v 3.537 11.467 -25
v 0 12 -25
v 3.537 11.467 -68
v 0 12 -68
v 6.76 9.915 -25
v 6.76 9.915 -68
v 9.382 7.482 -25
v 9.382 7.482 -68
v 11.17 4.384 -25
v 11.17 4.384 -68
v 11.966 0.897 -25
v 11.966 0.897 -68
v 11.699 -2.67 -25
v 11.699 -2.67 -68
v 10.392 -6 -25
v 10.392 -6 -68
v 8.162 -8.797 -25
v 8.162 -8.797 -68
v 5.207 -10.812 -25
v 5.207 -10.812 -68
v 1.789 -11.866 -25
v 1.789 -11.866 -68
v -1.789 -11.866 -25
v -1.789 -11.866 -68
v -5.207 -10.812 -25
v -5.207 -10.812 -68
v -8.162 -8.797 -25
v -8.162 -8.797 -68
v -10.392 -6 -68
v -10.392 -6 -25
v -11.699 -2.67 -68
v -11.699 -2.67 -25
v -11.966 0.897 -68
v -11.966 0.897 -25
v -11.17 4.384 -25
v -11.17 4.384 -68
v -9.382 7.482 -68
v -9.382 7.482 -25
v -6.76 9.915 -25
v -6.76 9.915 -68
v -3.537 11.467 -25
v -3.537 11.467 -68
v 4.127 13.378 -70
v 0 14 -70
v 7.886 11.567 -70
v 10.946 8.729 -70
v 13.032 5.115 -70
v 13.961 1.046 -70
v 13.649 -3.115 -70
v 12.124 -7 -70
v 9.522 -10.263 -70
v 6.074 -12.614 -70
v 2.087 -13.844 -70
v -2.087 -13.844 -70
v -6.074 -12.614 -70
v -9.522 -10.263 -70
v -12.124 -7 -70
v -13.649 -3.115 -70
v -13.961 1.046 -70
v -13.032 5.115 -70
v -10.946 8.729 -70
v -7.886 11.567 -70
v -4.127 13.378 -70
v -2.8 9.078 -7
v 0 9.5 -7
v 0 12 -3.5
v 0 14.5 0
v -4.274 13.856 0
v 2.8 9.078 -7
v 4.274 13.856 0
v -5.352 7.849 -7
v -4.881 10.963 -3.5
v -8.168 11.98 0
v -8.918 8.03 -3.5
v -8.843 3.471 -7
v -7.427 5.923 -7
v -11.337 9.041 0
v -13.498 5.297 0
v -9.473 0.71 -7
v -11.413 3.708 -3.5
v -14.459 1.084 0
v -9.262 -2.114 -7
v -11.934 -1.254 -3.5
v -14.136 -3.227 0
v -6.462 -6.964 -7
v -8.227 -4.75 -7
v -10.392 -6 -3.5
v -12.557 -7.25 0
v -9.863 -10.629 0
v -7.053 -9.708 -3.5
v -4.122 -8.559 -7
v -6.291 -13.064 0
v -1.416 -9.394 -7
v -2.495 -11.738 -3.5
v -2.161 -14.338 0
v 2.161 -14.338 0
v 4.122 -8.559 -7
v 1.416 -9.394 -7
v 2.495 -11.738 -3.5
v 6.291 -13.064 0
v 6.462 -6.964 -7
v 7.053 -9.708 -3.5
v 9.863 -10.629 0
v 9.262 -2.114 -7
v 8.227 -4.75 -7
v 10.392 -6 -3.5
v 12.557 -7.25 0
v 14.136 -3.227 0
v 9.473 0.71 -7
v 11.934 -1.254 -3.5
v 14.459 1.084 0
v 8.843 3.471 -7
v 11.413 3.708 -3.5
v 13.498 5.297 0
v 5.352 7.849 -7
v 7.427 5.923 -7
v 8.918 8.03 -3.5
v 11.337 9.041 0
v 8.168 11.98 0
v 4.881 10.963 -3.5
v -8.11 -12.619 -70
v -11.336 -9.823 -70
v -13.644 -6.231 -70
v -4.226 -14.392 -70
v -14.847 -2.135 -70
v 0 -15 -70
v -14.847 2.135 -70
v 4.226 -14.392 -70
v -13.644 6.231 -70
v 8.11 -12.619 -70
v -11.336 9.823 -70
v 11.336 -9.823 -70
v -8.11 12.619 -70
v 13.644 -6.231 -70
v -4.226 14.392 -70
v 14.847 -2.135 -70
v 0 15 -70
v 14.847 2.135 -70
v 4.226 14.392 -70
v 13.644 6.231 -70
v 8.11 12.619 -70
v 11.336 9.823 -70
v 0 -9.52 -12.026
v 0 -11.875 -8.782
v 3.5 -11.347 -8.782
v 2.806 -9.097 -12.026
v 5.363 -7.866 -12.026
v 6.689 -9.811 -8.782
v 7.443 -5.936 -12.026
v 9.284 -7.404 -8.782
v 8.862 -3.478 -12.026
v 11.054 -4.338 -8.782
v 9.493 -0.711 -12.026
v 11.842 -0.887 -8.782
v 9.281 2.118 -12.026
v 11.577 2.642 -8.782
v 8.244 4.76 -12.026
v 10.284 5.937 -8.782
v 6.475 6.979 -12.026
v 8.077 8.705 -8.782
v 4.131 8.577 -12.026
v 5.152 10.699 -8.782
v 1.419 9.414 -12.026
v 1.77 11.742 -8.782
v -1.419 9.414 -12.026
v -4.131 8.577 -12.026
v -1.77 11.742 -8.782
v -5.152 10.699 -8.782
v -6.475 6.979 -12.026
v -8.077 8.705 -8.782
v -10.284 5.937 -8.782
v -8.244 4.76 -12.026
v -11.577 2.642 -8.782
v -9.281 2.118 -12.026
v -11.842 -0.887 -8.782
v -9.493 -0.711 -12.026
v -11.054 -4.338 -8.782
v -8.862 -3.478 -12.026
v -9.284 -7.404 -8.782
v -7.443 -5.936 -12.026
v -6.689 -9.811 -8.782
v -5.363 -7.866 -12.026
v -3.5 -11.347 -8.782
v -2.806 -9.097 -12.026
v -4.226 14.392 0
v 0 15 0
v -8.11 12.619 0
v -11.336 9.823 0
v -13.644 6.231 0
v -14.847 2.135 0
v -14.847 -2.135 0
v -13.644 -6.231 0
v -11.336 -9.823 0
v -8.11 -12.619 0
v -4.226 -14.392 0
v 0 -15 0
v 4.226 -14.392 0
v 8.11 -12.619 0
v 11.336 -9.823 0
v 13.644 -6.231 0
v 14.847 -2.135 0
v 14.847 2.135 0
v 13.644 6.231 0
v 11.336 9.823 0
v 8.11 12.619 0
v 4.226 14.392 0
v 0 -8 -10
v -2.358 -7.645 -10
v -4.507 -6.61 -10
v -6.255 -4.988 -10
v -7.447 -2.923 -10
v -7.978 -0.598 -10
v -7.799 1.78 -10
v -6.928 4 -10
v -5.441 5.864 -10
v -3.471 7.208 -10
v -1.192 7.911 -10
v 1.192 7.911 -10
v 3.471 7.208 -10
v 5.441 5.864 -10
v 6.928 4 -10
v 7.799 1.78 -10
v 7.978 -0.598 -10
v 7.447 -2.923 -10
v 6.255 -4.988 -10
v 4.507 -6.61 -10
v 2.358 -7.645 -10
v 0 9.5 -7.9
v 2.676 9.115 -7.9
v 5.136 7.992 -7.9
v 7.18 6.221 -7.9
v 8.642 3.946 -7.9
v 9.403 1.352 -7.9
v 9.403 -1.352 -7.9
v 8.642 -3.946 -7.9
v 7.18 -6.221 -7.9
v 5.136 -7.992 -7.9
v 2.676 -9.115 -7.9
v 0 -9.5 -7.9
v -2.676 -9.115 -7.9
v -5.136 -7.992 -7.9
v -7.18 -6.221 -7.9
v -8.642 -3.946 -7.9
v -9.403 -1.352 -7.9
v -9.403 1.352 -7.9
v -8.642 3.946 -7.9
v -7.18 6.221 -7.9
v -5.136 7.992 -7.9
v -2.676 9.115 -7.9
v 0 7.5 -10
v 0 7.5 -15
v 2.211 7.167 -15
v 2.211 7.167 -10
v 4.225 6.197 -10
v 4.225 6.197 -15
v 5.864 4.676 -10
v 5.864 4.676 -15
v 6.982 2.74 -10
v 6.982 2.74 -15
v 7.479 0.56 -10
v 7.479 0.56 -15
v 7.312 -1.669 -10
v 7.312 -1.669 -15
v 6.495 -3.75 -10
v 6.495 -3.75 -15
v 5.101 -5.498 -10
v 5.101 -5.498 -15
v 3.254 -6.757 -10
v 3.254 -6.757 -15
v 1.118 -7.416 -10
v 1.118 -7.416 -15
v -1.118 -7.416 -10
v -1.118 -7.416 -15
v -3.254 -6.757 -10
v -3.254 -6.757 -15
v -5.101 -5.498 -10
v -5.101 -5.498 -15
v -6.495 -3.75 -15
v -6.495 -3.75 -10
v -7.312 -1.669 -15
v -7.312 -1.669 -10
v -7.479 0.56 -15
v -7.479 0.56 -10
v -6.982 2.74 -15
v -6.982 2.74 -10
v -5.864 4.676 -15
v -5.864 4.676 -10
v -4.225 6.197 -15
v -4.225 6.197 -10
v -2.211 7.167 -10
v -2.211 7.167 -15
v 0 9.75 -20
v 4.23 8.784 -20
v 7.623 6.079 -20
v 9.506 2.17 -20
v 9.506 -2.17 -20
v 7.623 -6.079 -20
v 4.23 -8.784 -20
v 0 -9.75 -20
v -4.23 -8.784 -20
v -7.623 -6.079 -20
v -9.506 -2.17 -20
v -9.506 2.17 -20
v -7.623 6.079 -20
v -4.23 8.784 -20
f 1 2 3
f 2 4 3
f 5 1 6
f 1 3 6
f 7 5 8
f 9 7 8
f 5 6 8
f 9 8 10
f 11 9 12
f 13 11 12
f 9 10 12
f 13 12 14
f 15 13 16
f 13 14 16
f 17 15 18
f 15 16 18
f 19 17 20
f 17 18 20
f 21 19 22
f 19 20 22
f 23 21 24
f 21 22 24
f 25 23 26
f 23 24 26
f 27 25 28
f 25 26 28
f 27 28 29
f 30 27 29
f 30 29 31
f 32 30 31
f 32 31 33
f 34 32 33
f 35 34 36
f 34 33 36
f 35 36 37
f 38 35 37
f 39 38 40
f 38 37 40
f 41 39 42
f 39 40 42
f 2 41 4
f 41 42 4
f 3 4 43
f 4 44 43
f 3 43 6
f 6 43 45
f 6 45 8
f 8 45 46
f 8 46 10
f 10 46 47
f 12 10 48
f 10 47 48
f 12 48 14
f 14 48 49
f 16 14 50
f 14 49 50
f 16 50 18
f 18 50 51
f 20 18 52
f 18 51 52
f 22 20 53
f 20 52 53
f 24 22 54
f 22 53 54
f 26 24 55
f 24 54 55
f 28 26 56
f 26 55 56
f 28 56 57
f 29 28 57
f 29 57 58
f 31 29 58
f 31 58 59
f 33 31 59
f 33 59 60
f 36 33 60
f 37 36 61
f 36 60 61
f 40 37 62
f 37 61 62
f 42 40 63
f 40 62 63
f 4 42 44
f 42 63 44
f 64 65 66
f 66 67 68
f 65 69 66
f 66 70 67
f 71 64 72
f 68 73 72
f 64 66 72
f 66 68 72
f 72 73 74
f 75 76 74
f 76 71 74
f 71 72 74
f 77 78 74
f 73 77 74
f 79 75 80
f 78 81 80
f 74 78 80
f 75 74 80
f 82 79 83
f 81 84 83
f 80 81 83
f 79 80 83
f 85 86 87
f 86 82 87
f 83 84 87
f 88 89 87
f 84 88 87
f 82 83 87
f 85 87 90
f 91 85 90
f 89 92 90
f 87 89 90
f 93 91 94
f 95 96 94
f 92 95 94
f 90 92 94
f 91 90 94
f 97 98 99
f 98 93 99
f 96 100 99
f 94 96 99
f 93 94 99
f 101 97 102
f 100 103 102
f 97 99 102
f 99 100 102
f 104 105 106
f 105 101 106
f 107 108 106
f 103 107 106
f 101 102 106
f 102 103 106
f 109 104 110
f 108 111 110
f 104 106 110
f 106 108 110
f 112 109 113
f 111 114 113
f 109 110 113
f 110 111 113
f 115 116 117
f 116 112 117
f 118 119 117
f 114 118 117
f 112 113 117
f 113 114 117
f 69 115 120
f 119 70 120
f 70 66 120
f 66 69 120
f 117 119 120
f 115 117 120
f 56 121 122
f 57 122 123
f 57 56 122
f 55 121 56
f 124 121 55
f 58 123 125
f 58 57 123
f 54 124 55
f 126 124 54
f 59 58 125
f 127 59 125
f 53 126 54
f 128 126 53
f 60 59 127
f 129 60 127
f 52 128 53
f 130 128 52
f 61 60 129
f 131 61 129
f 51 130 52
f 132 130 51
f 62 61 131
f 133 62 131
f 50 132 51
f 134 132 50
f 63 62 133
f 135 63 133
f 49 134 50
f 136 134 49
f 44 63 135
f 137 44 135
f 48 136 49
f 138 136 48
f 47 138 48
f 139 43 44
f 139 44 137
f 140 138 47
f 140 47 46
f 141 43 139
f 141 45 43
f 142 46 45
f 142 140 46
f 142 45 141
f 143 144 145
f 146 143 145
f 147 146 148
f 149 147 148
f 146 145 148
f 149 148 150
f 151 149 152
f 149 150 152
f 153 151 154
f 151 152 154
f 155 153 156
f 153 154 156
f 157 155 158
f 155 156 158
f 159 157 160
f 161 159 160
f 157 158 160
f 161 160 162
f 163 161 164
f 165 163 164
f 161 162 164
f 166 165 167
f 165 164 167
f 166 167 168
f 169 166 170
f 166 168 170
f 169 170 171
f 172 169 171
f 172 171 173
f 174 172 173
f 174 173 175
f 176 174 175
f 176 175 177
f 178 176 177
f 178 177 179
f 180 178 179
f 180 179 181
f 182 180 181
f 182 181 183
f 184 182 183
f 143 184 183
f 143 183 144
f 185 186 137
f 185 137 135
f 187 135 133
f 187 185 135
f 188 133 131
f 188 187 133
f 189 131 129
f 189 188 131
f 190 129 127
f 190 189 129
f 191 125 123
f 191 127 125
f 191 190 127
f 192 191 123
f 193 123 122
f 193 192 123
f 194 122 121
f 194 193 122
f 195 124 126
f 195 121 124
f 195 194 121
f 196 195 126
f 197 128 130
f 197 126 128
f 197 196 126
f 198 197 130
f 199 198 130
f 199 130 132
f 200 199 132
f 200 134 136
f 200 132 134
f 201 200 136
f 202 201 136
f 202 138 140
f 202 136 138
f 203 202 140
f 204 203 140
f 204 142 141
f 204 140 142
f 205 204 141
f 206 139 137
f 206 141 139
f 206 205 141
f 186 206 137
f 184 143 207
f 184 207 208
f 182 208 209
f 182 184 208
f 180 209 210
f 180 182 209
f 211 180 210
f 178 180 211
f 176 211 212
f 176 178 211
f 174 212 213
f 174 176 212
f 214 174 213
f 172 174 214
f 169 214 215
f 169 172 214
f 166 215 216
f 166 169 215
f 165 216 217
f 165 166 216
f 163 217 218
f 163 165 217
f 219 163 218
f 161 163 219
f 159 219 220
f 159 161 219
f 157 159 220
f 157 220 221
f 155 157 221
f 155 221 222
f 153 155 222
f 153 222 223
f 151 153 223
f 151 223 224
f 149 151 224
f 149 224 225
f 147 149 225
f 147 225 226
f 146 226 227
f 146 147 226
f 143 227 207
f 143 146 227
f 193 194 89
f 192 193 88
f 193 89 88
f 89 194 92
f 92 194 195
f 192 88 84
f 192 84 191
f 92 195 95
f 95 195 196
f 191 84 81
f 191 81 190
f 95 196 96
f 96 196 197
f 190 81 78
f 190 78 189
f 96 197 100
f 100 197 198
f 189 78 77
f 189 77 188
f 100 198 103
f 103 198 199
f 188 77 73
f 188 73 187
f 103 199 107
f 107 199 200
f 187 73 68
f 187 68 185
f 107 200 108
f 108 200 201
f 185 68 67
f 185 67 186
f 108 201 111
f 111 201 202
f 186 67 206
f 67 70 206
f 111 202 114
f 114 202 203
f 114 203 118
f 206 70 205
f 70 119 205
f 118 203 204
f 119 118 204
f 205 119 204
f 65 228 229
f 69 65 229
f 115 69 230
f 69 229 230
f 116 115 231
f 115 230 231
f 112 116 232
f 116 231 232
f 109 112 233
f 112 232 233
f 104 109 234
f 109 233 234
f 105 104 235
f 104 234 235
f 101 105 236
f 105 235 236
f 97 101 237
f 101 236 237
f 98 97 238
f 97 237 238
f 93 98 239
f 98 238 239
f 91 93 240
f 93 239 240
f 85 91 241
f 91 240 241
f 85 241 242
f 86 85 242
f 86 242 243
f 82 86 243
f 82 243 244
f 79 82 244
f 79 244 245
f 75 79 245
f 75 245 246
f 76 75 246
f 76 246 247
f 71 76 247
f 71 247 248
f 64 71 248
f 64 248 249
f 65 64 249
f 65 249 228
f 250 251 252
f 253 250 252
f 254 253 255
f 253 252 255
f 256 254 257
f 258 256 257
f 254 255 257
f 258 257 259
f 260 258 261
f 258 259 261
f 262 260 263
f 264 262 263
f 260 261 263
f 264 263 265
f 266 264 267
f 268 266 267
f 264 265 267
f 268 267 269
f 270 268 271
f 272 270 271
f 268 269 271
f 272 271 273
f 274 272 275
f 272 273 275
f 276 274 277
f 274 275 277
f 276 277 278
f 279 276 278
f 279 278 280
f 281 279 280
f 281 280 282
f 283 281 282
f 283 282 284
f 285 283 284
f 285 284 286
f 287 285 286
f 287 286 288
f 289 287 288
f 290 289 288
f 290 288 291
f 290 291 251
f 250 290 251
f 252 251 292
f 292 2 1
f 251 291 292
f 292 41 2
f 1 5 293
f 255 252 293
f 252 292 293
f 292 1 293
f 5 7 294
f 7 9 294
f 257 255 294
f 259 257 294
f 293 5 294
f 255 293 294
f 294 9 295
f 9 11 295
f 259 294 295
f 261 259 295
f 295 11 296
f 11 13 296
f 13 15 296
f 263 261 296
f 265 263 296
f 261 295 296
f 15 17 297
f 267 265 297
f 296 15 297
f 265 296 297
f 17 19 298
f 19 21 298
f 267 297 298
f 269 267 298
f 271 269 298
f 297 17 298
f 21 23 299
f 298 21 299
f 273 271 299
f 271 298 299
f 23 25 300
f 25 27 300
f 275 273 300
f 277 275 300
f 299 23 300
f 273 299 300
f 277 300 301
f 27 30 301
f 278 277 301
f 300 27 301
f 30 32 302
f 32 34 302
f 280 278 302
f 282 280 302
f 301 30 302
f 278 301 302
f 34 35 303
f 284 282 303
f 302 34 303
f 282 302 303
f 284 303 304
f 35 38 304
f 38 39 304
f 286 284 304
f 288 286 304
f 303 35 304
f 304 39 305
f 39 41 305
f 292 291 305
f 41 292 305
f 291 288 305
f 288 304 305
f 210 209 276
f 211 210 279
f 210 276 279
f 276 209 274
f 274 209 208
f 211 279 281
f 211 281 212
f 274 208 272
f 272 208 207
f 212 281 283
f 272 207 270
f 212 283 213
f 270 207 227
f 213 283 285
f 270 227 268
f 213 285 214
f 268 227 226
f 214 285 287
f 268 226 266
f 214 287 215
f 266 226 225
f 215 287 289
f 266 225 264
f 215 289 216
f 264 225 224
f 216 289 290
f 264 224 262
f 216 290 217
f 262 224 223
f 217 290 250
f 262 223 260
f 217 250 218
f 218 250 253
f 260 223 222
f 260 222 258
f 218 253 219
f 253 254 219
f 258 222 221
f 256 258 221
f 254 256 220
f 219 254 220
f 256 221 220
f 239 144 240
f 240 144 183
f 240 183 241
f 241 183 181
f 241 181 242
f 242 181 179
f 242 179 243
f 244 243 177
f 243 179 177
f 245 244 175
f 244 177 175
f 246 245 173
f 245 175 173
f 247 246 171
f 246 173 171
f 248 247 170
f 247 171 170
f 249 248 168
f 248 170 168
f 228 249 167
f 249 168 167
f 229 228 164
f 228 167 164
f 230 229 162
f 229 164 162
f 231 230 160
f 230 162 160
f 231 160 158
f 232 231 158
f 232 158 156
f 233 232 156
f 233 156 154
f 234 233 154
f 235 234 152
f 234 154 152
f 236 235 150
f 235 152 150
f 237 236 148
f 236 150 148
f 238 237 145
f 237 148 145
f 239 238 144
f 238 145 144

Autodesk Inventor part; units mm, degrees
ref_plane "XZ Plane" through (0, 0, 0) normal (0, 1, 0) x (-1, 0, 0)
ref_plane "XY Plane" through (0, 0, 0) normal (0, 0, 1) x (1, 0, 0)
sketch "Esquisse1" plane through (0, 0, 0) normal (1, 0, 0) x (0, 1, 0)
  line L0 (9.5, 0) -> (9.5, -10)
  line L1 (0, 0) -> (0, -29.8331)
  line L2 (9.5, 0) -> (15, 0)
  line L3 (9.5, -10) -> (7.5, -10)
  line L4 (7.5, -10) -> (7.5, -15)
  line L5 (7.5, -15) -> (12, -25)
  line L6 (12, -25) -> (12, -70)
  line L7 (15, -70) -> (12, -70)
  line L8 (15, -70) -> (15, 0)
  dimension "d0" = 19
  dimension "d2" = 10
  dimension "d3" = 2
  dimension "d4" = 5
  dimension "d6" = 10
  dimension "d7" = 70
  dimension "d16" = 3
  dimension "d19" = 30
revolve "Révolution1" add sketch "Esquisse1" angle 360 about axis through (0, 0, 0) along (0, 0, -1)
chamfer "Chanfrein1" distance 5 distance2 7 1 edges at (0, -9.5, 0) measured on face at (-1.9544, 12.9294, 0)
chamfer "Chanfrein2" distance 2 angle 45 1 edges at (0, -12, -70)
ref_plane "Plan de construction1" through (-15, 0, -35) normal (1, 0, 0) x (0, 1, 0)
sketch "Esquisse3" plane through (-15, 0, -35) normal (1, 0, 0) x (0, 1, 0)
  circle A0 centre (0, 30) radius 3
  point P0 (0, 35)
  dimension "d23" = 6
  dimension "d24" = 5
extrude "Extrusion1" [suppressed]
sketch "Esquisse4" plane through (0, 0, 0) normal (1, 0, 0) x (0, 1, 0)
  line L0 (-15, 0) -> (15, 0) projected
  line L1 (-15, -70) -> (15, -70) projected
  line L2 (-9.5, -10) -> (-9.5, -7) projected
  line L3 (-9.5, -10) -> (9.5, -10) projected
  line L4 (-7.5, -15) -> (-7.5, -10) projected
  line L5 (-14.5, 0) -> (-9.5, -7) projected
  line L6 (-9.5, -7.9) -> (-11.8748, -8.7815)
  line L7 (-11.8748, -8.7815) -> (-9.5199, -12.0265)
  line L8 (-9.5199, -12.0265) -> (-8, -10)
  circle A0 centre (-9.5, -9.5) radius 1.5 construction
  line L9 (0, -72) -> (0, 12) projected
  point P0 (0, 0)
  dimension "d32" = 3
  dimension "d37" = 0.5
  dimension "d38" = 1.5
  dimension "d39" = 2.1
revolve "Révolution2" cut sketch "Esquisse4" angle 360 about axis through (0, 0, -10) along (0, 0, 1) contours L2 L3 L8 L7 L6
properties part number "cartridge_locker"
